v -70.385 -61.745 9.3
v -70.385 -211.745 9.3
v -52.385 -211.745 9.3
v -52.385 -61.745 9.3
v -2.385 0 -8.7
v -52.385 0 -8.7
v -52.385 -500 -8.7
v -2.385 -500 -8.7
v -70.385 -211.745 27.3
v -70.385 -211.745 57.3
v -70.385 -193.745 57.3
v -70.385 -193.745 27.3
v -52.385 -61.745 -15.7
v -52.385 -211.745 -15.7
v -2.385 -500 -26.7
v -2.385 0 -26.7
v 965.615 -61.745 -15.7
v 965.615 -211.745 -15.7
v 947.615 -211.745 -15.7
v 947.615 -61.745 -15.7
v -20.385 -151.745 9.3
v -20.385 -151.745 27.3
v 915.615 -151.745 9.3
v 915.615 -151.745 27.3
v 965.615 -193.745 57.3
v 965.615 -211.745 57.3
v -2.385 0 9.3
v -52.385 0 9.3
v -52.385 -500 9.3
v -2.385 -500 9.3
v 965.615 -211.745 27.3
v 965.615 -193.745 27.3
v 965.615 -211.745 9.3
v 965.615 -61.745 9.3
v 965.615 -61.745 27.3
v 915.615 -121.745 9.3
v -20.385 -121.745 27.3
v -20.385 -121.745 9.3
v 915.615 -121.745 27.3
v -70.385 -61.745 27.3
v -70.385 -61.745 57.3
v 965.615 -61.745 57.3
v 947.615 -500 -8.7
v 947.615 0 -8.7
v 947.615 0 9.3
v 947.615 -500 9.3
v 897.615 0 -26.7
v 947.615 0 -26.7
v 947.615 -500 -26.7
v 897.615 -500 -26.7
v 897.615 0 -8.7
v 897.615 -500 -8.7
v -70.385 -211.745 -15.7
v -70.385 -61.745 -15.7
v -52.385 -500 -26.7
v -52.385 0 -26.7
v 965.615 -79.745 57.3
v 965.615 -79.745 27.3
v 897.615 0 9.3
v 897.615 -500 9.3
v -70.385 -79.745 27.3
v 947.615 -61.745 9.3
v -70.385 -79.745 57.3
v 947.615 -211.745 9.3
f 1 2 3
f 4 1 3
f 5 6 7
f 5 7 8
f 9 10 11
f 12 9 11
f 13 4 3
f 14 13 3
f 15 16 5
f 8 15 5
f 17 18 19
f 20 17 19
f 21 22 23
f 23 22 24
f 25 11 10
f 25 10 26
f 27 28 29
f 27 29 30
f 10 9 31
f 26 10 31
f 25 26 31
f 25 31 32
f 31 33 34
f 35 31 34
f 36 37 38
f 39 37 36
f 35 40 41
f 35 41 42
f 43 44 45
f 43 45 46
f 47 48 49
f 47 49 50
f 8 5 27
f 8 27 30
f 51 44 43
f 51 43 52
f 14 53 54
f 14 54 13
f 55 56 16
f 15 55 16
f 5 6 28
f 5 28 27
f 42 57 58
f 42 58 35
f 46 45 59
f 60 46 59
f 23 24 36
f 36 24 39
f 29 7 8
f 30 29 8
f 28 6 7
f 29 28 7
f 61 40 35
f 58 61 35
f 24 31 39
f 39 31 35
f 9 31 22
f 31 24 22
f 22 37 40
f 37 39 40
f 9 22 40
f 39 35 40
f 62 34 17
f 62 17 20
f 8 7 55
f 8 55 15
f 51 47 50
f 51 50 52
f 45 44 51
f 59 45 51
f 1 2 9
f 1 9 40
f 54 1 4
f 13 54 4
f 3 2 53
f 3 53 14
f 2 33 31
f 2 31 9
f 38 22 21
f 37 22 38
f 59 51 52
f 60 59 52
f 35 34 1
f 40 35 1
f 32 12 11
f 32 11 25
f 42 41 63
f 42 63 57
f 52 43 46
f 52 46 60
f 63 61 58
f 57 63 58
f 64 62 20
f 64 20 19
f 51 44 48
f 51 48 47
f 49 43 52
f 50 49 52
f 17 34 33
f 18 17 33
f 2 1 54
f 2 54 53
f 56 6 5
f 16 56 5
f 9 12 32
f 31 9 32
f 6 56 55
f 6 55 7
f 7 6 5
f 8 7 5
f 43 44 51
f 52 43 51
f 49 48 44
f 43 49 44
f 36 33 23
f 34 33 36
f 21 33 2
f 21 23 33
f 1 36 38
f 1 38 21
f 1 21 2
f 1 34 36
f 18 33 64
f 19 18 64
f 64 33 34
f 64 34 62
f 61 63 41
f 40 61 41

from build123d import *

# Parameters (mm, degrees)
F0_W      = 50
F0_H      = 18
F1_DEPTH  = 500
F2_DEPTH  = 18
F3_W      = 518
F3_H      = 150
F4_DEPTH  = 18
F5_W      = 18
F5_H      = 150
F6_DEPTH  = 25
F9_W      = 1036
F9_H      = 18
F10_DEPTH = 30
F9_W_2    = 936
F9_H_2    = 30
F11_DEPTH = 25


with BuildPart() as f1:
    # F0 (on Front) → F1 (new body)
    with BuildSketch(Plane.XZ):
        with Locations((-27.3853807012, -17.700068422)):
            Rectangle(F0_W, F0_H)
    extrude(amount=F1_DEPTH)


with BuildPart() as f2:
    # F2 (new): a face of the model
    f2_faces = [f1.part.faces().sort_by_distance(p)[0] for p in [
        (-27.3853807012, -250, -8.700068422),
    ]]
    extrude(f2_faces, amount=F2_DEPTH)


with BuildPart() as f4:
    # F3 (on face) → F4 (new body)
    with BuildSketch(Plane.XY.offset(9.299931578)):
        with Locations((188.6146192988, -136.7446185101)):
            Rectangle(F3_W, F3_H)
    extrude(amount=F4_DEPTH)

    # F8: F4 across face


with BuildPart() as f6:
    # F5 (on face) → F6 (new body)
    with BuildSketch(Plane(origin=(0, 0, 9.299931578), x_dir=(1, 0, 0), z_dir=(0, 0, -1))):
        with Locations((-61.3853807012, 136.7446185101)):
            Rectangle(F5_W, F5_H)
    extrude(amount=F6_DEPTH)


with BuildPart() as f7_1:
    # F7: instance of F2
    add(f2.part.mirror(Plane(origin=(447.6146192988, -136.7446185101, 18.299931578), x_dir=(0, 1, 0), z_dir=(1, 0, 0))))


with BuildPart() as f7_2:
    # F7: instance of F1
    add(f1.part.mirror(Plane(origin=(447.6146192988, -136.7446185101, 18.299931578), x_dir=(0, 1, 0), z_dir=(1, 0, 0))))


with BuildPart() as f7_3:
    # F7: instance of F6
    add(f6.part.mirror(Plane(origin=(447.6146192988, -136.7446185101, 18.299931578), x_dir=(0, 1, 0), z_dir=(1, 0, 0))))


with BuildPart() as f4_1:
    add(f4.part)
    add(f4.part.mirror(Plane(origin=(447.6146192988, -136.7446185101, 18.299931578), x_dir=(0, 1, 0), z_dir=(1, 0, 0))))

    # F9 (on face) → F11 (cut)
    with BuildSketch(Plane.XY.offset(27.299931578)):
        with Locations((447.6146192988, -136.7446185101)):
            Rectangle(F9_W_2, F9_H_2)
    extrude(amount=-F11_DEPTH, mode=Mode.SUBTRACT)


with BuildPart() as f10:
    # F9 (on face) → F10 (new body)
    with BuildSketch(Plane.XY.offset(27.299931578)):
        with Locations((447.6146192988, -70.7446185101)):
            Rectangle(F9_W, F9_H)
    extrude(amount=F10_DEPTH)


with BuildPart() as f10b:
    # F9 (on face) → F10, piece 2 (new body)
    with BuildSketch(Plane.XY.offset(27.299931578)):
        with Locations((447.6146192988, -202.7446185101)):
            Rectangle(F9_W, F9_H)
    extrude(amount=F10_DEPTH)


solid = Compound([f1.part, f2.part, f6.part, f7_1.part, f7_2.part, f7_3.part, f4_1.part, f10.part, f10b.part])
